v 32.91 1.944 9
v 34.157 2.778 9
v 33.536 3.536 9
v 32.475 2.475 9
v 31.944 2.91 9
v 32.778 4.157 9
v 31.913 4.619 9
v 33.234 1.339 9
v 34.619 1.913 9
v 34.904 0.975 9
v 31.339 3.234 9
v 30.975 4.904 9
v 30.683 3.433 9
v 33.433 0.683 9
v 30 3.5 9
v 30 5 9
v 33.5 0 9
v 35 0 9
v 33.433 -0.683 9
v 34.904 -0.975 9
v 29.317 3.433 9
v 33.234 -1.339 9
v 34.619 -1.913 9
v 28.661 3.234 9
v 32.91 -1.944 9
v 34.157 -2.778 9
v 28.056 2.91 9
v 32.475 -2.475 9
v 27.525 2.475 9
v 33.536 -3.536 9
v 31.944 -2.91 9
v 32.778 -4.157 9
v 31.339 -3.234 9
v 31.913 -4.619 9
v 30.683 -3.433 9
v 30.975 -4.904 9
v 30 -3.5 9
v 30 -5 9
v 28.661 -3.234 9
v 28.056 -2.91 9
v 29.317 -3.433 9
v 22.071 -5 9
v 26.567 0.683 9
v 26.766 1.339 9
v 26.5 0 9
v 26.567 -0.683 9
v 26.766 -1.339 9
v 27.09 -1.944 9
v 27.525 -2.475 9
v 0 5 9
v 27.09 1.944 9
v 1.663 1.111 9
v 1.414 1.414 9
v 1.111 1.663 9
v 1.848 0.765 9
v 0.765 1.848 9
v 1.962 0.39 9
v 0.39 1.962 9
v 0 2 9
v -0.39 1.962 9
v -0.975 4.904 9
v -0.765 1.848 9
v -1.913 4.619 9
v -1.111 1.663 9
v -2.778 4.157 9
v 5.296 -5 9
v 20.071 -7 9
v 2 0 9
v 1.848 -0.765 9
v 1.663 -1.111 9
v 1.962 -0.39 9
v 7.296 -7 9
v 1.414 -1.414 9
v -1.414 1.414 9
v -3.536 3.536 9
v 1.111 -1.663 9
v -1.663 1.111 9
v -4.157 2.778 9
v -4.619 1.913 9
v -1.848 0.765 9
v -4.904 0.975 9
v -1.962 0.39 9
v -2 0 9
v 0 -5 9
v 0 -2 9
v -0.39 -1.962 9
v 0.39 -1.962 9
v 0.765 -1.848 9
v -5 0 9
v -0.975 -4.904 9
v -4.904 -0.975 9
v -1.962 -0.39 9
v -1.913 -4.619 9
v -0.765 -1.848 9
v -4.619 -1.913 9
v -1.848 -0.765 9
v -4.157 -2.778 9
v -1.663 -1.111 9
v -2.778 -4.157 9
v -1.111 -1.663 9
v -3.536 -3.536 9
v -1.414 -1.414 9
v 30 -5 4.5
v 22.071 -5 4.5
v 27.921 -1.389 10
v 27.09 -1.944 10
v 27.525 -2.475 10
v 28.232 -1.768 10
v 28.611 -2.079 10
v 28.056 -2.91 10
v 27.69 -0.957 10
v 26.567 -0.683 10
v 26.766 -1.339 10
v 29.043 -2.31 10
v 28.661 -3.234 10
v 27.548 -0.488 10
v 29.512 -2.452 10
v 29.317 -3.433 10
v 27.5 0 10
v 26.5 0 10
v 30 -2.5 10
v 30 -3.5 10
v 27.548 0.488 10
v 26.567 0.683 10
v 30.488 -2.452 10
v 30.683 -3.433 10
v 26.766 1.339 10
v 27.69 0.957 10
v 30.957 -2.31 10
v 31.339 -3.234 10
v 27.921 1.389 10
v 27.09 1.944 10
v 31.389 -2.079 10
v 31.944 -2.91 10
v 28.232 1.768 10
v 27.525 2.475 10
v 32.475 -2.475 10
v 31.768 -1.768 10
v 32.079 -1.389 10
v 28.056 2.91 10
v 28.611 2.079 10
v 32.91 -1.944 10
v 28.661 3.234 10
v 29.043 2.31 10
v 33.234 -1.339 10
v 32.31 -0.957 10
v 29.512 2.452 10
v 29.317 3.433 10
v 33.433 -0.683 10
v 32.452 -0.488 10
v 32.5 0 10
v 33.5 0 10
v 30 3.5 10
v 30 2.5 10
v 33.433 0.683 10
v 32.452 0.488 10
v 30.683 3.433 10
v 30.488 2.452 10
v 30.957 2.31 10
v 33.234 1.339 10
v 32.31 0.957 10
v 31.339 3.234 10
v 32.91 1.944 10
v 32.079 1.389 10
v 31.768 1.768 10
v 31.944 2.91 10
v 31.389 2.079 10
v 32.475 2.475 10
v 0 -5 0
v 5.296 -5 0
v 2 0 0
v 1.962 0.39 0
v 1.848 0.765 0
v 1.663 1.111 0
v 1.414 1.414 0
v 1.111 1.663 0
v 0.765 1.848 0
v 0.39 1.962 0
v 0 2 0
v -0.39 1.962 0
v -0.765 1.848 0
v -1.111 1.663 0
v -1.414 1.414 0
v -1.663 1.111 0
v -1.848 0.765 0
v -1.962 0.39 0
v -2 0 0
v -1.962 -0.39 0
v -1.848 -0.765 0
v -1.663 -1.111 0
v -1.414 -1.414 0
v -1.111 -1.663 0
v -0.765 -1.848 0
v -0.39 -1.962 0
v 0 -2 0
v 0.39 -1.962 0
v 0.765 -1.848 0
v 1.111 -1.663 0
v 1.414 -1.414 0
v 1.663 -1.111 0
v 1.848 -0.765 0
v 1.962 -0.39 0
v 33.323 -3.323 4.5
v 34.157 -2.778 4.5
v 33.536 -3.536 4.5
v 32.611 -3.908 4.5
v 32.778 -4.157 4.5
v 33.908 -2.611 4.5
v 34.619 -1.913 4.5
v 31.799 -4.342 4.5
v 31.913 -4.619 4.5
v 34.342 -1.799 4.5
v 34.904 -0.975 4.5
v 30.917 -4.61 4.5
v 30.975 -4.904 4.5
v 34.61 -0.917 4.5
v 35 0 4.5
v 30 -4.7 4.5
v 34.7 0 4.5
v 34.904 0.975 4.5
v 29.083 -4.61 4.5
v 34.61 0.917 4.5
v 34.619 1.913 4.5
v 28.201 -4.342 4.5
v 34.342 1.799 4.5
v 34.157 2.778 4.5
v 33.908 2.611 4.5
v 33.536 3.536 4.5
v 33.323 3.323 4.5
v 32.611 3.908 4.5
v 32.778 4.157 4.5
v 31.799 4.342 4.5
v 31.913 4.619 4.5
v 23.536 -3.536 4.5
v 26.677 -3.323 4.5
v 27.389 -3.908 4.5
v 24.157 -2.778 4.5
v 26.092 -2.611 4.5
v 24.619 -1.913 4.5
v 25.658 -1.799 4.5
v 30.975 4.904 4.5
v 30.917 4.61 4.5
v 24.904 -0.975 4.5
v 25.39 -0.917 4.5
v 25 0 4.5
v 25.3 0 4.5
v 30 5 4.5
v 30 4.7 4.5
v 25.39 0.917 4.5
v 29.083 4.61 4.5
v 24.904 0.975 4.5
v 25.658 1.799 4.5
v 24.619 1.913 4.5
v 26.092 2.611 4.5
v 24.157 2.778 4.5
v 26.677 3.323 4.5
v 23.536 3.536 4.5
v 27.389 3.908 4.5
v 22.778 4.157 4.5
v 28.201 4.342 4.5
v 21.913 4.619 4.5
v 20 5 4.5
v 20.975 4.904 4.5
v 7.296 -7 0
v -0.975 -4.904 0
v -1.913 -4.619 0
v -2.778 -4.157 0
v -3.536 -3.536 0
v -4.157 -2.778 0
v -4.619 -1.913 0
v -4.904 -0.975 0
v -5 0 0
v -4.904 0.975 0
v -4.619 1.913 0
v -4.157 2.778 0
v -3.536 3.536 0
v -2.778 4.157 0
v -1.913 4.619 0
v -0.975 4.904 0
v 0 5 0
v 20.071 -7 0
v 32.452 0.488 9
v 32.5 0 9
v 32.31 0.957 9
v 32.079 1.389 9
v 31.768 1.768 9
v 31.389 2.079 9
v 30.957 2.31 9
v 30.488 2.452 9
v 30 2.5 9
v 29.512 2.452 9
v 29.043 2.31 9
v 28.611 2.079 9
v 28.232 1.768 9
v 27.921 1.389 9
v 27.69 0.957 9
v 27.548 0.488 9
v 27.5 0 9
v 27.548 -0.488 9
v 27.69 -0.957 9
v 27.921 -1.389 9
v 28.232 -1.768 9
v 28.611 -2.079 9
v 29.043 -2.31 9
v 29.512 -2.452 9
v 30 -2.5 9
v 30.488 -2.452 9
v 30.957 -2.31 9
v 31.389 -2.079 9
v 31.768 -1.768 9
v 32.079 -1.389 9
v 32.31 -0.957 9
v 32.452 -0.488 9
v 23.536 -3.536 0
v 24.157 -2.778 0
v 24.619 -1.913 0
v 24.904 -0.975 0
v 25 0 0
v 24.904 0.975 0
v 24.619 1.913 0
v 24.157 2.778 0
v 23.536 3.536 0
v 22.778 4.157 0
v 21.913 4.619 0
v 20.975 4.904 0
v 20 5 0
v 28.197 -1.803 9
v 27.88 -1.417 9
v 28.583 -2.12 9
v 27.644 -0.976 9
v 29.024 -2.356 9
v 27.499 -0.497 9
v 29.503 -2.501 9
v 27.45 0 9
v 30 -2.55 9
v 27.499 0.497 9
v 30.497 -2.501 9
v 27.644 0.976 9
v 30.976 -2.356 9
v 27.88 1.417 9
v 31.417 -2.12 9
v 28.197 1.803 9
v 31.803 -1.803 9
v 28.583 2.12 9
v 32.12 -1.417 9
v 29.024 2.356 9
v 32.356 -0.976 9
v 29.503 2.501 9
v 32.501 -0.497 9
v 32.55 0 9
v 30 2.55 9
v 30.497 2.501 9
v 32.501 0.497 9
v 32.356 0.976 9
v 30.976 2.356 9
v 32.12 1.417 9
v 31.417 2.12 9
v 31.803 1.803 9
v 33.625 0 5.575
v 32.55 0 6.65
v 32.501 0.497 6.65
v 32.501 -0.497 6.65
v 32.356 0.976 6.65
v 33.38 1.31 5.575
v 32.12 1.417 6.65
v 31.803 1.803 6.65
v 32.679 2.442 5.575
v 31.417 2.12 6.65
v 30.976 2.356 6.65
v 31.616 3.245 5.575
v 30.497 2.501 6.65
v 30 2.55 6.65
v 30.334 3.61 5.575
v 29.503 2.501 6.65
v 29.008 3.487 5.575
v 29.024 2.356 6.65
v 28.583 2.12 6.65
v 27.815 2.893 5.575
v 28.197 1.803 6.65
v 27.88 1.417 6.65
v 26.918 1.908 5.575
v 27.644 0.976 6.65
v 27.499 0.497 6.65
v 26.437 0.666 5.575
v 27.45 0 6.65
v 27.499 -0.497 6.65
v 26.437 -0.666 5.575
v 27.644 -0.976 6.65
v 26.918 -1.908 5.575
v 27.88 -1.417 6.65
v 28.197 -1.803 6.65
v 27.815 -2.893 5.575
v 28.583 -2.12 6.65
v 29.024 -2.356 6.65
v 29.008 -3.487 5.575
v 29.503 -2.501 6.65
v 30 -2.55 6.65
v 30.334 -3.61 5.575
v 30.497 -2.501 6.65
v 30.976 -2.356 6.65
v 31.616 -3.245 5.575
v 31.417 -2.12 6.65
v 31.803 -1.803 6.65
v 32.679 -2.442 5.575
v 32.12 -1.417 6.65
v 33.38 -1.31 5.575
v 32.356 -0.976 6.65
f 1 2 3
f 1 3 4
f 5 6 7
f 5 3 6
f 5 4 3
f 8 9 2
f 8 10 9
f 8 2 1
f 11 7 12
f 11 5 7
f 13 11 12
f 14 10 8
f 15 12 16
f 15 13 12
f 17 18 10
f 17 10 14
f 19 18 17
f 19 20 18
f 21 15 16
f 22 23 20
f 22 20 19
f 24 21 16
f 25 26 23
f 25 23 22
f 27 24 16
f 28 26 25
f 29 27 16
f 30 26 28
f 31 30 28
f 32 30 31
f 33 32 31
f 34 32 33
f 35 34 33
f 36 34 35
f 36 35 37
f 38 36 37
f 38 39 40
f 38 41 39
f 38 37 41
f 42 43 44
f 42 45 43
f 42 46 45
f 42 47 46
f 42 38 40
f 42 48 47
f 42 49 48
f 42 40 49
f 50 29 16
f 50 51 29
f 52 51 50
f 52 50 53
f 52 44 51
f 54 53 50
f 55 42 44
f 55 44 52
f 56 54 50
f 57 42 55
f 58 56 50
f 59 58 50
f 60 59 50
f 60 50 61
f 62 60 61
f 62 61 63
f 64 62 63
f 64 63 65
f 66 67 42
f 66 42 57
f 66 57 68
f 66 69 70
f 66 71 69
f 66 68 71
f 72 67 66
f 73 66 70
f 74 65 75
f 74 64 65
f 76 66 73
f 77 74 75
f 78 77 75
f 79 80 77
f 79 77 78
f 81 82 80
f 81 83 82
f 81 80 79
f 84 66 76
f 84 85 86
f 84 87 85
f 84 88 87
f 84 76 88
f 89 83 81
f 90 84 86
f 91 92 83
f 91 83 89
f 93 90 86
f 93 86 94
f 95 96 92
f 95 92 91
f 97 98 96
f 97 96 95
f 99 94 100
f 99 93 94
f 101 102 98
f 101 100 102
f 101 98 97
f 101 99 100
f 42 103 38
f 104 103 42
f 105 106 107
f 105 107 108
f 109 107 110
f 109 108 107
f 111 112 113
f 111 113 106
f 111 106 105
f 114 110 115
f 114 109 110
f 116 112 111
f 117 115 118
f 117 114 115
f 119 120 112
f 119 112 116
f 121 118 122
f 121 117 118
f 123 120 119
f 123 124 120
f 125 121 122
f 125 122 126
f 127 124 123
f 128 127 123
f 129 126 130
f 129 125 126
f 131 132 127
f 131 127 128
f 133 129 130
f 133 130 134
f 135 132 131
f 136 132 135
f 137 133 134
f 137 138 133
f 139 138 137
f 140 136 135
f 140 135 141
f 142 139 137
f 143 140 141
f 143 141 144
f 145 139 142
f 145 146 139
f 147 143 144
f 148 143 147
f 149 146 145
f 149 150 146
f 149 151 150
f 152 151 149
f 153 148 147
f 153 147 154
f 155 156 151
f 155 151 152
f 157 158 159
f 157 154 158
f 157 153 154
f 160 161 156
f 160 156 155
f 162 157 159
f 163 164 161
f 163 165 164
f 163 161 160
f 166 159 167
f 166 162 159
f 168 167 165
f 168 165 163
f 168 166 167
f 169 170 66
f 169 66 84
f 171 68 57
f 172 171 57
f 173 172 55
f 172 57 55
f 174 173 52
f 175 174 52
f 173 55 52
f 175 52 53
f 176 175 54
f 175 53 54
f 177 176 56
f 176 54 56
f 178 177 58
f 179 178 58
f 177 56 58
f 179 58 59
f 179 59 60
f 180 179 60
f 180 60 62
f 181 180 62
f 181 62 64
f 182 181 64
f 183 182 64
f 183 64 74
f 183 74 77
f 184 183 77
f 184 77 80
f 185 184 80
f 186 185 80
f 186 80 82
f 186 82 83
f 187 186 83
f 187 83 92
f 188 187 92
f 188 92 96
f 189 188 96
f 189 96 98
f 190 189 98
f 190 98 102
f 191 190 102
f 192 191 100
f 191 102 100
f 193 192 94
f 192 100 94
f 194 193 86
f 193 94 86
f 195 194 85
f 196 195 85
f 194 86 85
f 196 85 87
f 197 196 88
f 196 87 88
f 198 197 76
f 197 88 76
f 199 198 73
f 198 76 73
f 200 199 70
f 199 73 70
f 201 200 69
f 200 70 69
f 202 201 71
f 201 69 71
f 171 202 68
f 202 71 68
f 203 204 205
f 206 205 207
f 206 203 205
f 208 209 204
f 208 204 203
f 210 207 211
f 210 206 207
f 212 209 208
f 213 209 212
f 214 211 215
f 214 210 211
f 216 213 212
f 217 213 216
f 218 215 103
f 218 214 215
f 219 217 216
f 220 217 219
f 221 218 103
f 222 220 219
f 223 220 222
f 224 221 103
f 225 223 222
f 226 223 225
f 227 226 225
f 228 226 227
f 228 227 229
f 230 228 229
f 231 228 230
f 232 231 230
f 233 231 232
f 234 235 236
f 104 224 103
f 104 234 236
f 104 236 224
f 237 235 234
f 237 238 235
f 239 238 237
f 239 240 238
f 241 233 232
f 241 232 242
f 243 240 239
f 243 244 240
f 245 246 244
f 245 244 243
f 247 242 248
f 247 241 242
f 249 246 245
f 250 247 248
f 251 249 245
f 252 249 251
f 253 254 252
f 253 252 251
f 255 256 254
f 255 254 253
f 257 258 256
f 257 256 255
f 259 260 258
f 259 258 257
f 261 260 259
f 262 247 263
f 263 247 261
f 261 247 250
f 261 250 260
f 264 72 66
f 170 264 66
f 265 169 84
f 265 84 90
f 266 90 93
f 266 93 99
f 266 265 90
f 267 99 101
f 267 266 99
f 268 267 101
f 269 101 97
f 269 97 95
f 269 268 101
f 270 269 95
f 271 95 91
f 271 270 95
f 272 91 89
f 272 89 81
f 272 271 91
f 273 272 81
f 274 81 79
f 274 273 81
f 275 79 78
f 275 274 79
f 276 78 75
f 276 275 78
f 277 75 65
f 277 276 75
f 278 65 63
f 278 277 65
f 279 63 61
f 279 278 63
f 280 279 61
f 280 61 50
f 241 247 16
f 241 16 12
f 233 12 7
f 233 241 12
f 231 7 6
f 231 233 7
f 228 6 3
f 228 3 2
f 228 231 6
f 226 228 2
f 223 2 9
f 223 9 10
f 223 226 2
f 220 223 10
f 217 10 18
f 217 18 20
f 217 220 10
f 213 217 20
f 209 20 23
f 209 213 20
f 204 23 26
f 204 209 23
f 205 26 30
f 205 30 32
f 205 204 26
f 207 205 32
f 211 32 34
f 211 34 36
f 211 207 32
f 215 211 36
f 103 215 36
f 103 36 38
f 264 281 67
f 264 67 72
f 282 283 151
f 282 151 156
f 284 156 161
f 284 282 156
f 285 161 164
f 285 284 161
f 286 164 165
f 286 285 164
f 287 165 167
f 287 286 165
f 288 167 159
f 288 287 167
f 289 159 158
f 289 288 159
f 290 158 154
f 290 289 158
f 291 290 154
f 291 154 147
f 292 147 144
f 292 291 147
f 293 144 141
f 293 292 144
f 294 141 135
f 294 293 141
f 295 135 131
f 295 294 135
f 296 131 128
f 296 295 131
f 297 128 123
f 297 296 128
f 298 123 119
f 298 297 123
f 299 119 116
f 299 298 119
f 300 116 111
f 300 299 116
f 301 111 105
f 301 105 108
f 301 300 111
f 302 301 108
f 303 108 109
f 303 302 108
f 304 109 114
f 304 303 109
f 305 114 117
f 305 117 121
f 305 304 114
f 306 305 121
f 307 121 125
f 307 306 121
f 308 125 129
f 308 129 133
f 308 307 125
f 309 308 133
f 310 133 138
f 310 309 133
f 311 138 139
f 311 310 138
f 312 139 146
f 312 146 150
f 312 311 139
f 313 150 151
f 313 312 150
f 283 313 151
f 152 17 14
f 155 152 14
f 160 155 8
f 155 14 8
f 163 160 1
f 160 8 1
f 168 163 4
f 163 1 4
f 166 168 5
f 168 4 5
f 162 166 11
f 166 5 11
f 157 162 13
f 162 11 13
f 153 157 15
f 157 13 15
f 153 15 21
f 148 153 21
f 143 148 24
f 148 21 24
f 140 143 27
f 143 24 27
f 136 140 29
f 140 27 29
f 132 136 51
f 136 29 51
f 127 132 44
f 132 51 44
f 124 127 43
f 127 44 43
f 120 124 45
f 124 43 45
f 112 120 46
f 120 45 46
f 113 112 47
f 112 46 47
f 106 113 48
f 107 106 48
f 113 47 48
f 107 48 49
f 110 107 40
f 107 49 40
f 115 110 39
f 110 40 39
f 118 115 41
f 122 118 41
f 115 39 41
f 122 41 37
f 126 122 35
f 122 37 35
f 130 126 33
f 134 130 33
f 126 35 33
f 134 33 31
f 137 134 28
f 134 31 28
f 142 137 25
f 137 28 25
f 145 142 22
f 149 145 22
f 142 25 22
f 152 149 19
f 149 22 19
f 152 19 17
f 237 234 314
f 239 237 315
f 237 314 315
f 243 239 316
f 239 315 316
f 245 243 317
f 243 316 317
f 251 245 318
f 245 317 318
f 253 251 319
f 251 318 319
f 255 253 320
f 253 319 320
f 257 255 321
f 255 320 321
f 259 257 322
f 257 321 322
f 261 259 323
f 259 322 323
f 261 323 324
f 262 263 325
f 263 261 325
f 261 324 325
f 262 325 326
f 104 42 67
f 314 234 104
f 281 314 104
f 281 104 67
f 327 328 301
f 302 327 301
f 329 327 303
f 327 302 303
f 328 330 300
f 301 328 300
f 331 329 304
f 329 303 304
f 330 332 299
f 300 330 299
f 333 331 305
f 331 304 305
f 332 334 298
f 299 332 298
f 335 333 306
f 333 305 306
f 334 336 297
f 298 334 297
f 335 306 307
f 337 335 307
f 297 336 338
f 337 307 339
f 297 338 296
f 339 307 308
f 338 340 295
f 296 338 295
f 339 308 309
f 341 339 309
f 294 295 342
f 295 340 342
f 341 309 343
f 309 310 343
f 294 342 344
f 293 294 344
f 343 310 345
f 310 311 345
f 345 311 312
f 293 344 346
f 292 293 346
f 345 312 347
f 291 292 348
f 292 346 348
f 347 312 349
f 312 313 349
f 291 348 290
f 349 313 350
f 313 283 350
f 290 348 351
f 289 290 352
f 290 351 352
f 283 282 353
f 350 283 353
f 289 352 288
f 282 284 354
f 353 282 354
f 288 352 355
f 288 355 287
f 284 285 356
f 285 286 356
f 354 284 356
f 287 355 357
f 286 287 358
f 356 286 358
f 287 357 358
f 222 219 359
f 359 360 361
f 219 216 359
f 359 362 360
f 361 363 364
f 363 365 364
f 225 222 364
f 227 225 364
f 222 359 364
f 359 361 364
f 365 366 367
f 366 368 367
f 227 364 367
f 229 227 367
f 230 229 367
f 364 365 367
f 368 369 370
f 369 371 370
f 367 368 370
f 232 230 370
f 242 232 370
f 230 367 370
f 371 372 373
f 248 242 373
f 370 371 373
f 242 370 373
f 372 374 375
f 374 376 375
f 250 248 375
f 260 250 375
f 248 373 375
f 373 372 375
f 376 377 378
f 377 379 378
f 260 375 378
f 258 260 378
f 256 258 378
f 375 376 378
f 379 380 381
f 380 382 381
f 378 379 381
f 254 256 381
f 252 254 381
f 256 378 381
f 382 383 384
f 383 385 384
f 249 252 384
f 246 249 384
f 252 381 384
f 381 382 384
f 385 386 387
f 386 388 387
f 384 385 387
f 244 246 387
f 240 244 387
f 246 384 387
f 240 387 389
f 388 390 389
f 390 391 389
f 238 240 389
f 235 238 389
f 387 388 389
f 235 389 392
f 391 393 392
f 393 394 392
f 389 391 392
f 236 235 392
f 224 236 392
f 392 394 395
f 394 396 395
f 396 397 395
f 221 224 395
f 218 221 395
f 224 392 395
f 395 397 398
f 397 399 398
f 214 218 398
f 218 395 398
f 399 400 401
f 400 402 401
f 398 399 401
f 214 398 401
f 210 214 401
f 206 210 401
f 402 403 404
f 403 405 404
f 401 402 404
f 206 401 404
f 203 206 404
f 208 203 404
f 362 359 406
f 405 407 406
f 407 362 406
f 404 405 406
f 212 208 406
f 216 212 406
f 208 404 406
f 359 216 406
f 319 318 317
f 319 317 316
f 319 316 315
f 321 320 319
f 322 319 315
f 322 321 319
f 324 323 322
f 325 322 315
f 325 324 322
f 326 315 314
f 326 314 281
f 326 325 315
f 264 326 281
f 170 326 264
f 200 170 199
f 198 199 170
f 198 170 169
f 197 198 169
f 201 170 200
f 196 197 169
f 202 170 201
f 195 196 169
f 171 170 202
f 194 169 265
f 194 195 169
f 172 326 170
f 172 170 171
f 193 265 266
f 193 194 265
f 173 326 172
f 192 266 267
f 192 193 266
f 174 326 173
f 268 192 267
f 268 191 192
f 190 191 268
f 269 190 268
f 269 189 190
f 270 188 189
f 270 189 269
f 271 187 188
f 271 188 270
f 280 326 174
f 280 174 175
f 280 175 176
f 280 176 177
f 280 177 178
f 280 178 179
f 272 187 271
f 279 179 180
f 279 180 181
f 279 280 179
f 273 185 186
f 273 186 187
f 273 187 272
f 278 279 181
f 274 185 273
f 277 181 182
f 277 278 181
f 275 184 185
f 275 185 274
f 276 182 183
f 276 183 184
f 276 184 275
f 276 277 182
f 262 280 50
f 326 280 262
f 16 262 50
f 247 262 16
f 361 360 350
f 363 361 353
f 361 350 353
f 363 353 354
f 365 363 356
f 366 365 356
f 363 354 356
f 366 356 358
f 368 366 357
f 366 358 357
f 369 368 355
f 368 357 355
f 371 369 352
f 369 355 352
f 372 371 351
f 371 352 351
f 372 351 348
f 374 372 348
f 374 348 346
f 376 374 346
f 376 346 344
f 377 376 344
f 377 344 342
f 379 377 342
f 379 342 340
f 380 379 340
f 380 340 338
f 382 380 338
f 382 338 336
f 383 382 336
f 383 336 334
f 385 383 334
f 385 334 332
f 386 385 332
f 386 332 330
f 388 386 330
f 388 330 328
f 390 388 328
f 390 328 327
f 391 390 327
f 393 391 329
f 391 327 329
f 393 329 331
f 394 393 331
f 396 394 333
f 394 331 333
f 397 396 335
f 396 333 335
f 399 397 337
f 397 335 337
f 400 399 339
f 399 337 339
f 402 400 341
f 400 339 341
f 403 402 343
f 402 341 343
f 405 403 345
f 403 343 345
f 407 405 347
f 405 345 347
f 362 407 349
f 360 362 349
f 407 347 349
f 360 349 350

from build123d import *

# Parameters (mm, degrees)
P_IDAT_VYSUNUT_M1_DEPTH                           = 9
SKICA2_R                                          = 2
SKICA2_R_2                                        = 2.55
ODEBRAT_VYSUNUT_M1_DEPTH                          = 10
SKICA4_OUTSIDE_W                                  = 50.44
SKICA4_OUTSIDE_H                                  = 20.44
ODEBRAT_VYSUNUT_M5_DEPTH                          = 4.5
KU_ELOV_ZAHLOUBEN_PRO_M4_ROUBU_SE_Z_P_D           = 4.5
KU_ELOV_ZAHLOUBEN_PRO_M4_ROUBU_SE_Z_P_DEPTH       = 13.5
KU_ELOV_ZAHLOUBEN_PRO_M4_ROUBU_SE_Z_P_CSINK_D     = 9.4
KU_ELOV_ZAHLOUBEN_PRO_M4_ROUBU_SE_Z_P_CSINK_ANGLE = 90
KU_ELOV_ZAHLOUBEN_PRO_M4_ROUBU_SE_Z_P_TIP         = 1.351936393
SKICA14_R                                         = 3.5
SKICA14_R_2                                       = 2.5
P_IDAT_VYSUNUT_M3_DEPTH                           = 1
P_IDAT_VYSUNUT_M5_REACH                           = 38.742
SKICA15_R                                         = 2


with BuildPart() as part:
    # Skica1 → Přidat vysunutím1 (new body)
    with BuildSketch(Plane.XY):
        with BuildLine():
            Line((0, 5), (30, 5))
            ThreePointArc((30, 5), (35, 0), (30, -5))
            Line((30, -5), (0, -5))
            ThreePointArc((0, -5), (-5, 0), (0, 5))
        make_face()
    extrude(amount=P_IDAT_VYSUNUT_M1_DEPTH)

    # Skica2 → Odebrat vysunutím1 (cut)
    with BuildSketch(Plane.XY.offset(9)):
        Circle(SKICA2_R)
        with Locations((30, 0)):
            Circle(SKICA2_R_2)
    extrude(amount=-ODEBRAT_VYSUNUT_M1_DEPTH, mode=Mode.SUBTRACT)

    # Skica4 outside → Odebrat vysunutím5 (cut)
    with BuildSketch(Plane(origin=(0, 0, 0), x_dir=(-1, 0, 0), z_dir=(0, 0, -1))):
        with Locations((-15, 0)):
            Rectangle(SKICA4_OUTSIDE_W, SKICA4_OUTSIDE_H)
        with BuildLine():
            Line((0, -5), (-20, -5))
            ThreePointArc((-20, -5), (-25, 0), (-20, 5))
            Line((-20, 5), (0, 5))
            ThreePointArc((0, 5), (5, 0), (0, -5))
        make_face(mode=Mode.SUBTRACT)
    extrude(amount=-ODEBRAT_VYSUNUT_M5_DEPTH, mode=Mode.SUBTRACT)

    # Kuželové zahloubení pro M4 šroubu se zápustnou hlavou plochou1
    with Locations(Plane(origin=(0, 0, 4.5), x_dir=(-1, 0, 0), z_dir=(0, 0, -1))):
        with Locations((-30, 0)):
            CounterSinkHole(KU_ELOV_ZAHLOUBEN_PRO_M4_ROUBU_SE_Z_P_D / 2, KU_ELOV_ZAHLOUBEN_PRO_M4_ROUBU_SE_Z_P_CSINK_D / 2, depth=KU_ELOV_ZAHLOUBEN_PRO_M4_ROUBU_SE_Z_P_DEPTH, counter_sink_angle=KU_ELOV_ZAHLOUBEN_PRO_M4_ROUBU_SE_Z_P_CSINK_ANGLE)
            with Locations((0, 0, -(KU_ELOV_ZAHLOUBEN_PRO_M4_ROUBU_SE_Z_P_DEPTH + KU_ELOV_ZAHLOUBEN_PRO_M4_ROUBU_SE_Z_P_TIP / 2))):  # 118° drill point
                Cone(0, KU_ELOV_ZAHLOUBEN_PRO_M4_ROUBU_SE_Z_P_D / 2, KU_ELOV_ZAHLOUBEN_PRO_M4_ROUBU_SE_Z_P_TIP, mode=Mode.SUBTRACT)

    # Skica14 → Přidat vysunutím3 (add)
    with BuildSketch(Plane.XY.offset(9)):
        with Locations((30, 0)):
            Circle(SKICA14_R)
        with Locations((30, 0)):
            Circle(SKICA14_R_2, mode=Mode.SUBTRACT)
    extrude(amount=P_IDAT_VYSUNUT_M3_DEPTH)

    # Přidat vysunutím5: up to this face of the body (flat: up to its plane)
    p_idat_vysunut_m5_end = Plane(part.part.faces().sort_by_distance((13.81286954, 0, 9))[0])
    # Skica15 → Přidat vysunutím5 (add, up to the picked face)
    with BuildSketch(Plane(origin=(0, 0, 0), x_dir=(-1, 0, 0), z_dir=(0, 0, -1)), mode=Mode.PRIVATE) as p_idat_vysunut_m5_sk1:
        with BuildLine():
            Line((-25, 0), (-5.295627791, 0))
            Line((-5.295627791, 0), (-5.295627791, -5))
            Line((-5.295627791, -5), (0, -5))
            ThreePointArc((0, -5), (5, 0), (0, 5))
            Line((0, 5), (-20, 5))
            ThreePointArc((-20, 5), (-23.535533906, 3.535533906), (-25, 0))
        make_face()
        with Locations(Location((0, 0, 0), (0, 0, 180))):
            Circle(SKICA15_R, mode=Mode.SUBTRACT)
    p_idat_vysunut_m5_tool1 = split(extrude(p_idat_vysunut_m5_sk1.sketch, amount=-P_IDAT_VYSUNUT_M5_REACH, mode=Mode.PRIVATE), bisect_by=p_idat_vysunut_m5_end, keep=Keep.BOTH, mode=Mode.PRIVATE)
    # Skica15 → Přidat vysunutím5 (add, up to the picked face)
    with BuildSketch(Plane(origin=(0, 0, 0), x_dir=(-1, 0, 0), z_dir=(0, 0, -1)), mode=Mode.PRIVATE) as p_idat_vysunut_m5_sk2:
        with BuildLine():
            Line((-7.295627791, -7), (-5.295627791, -5))
            Line((-5.295627791, -5), (-20, -5))
            ThreePointArc((-20, -5), (-21.913417162, -4.619397663), (-23.535533906, -3.535533906))
            Line((-23.535533906, -3.535533906), (-20.071067812, -7))
            Line((-20.071067812, -7), (-7.295627791, -7))
        make_face()
    p_idat_vysunut_m5_tool2 = split(extrude(p_idat_vysunut_m5_sk2.sketch, amount=-P_IDAT_VYSUNUT_M5_REACH, mode=Mode.PRIVATE), bisect_by=p_idat_vysunut_m5_end, keep=Keep.BOTH, mode=Mode.PRIVATE)
    add(p_idat_vysunut_m5_tool1.solids().sort_by(Axis((8.223408, 1.304685, 0), (0, 0, 1)))[0])
    add(p_idat_vysunut_m5_tool2.solids().sort_by(Axis((13.831058, -5.932433, 0), (0, 0, 1)))[0])


solid = part.part
